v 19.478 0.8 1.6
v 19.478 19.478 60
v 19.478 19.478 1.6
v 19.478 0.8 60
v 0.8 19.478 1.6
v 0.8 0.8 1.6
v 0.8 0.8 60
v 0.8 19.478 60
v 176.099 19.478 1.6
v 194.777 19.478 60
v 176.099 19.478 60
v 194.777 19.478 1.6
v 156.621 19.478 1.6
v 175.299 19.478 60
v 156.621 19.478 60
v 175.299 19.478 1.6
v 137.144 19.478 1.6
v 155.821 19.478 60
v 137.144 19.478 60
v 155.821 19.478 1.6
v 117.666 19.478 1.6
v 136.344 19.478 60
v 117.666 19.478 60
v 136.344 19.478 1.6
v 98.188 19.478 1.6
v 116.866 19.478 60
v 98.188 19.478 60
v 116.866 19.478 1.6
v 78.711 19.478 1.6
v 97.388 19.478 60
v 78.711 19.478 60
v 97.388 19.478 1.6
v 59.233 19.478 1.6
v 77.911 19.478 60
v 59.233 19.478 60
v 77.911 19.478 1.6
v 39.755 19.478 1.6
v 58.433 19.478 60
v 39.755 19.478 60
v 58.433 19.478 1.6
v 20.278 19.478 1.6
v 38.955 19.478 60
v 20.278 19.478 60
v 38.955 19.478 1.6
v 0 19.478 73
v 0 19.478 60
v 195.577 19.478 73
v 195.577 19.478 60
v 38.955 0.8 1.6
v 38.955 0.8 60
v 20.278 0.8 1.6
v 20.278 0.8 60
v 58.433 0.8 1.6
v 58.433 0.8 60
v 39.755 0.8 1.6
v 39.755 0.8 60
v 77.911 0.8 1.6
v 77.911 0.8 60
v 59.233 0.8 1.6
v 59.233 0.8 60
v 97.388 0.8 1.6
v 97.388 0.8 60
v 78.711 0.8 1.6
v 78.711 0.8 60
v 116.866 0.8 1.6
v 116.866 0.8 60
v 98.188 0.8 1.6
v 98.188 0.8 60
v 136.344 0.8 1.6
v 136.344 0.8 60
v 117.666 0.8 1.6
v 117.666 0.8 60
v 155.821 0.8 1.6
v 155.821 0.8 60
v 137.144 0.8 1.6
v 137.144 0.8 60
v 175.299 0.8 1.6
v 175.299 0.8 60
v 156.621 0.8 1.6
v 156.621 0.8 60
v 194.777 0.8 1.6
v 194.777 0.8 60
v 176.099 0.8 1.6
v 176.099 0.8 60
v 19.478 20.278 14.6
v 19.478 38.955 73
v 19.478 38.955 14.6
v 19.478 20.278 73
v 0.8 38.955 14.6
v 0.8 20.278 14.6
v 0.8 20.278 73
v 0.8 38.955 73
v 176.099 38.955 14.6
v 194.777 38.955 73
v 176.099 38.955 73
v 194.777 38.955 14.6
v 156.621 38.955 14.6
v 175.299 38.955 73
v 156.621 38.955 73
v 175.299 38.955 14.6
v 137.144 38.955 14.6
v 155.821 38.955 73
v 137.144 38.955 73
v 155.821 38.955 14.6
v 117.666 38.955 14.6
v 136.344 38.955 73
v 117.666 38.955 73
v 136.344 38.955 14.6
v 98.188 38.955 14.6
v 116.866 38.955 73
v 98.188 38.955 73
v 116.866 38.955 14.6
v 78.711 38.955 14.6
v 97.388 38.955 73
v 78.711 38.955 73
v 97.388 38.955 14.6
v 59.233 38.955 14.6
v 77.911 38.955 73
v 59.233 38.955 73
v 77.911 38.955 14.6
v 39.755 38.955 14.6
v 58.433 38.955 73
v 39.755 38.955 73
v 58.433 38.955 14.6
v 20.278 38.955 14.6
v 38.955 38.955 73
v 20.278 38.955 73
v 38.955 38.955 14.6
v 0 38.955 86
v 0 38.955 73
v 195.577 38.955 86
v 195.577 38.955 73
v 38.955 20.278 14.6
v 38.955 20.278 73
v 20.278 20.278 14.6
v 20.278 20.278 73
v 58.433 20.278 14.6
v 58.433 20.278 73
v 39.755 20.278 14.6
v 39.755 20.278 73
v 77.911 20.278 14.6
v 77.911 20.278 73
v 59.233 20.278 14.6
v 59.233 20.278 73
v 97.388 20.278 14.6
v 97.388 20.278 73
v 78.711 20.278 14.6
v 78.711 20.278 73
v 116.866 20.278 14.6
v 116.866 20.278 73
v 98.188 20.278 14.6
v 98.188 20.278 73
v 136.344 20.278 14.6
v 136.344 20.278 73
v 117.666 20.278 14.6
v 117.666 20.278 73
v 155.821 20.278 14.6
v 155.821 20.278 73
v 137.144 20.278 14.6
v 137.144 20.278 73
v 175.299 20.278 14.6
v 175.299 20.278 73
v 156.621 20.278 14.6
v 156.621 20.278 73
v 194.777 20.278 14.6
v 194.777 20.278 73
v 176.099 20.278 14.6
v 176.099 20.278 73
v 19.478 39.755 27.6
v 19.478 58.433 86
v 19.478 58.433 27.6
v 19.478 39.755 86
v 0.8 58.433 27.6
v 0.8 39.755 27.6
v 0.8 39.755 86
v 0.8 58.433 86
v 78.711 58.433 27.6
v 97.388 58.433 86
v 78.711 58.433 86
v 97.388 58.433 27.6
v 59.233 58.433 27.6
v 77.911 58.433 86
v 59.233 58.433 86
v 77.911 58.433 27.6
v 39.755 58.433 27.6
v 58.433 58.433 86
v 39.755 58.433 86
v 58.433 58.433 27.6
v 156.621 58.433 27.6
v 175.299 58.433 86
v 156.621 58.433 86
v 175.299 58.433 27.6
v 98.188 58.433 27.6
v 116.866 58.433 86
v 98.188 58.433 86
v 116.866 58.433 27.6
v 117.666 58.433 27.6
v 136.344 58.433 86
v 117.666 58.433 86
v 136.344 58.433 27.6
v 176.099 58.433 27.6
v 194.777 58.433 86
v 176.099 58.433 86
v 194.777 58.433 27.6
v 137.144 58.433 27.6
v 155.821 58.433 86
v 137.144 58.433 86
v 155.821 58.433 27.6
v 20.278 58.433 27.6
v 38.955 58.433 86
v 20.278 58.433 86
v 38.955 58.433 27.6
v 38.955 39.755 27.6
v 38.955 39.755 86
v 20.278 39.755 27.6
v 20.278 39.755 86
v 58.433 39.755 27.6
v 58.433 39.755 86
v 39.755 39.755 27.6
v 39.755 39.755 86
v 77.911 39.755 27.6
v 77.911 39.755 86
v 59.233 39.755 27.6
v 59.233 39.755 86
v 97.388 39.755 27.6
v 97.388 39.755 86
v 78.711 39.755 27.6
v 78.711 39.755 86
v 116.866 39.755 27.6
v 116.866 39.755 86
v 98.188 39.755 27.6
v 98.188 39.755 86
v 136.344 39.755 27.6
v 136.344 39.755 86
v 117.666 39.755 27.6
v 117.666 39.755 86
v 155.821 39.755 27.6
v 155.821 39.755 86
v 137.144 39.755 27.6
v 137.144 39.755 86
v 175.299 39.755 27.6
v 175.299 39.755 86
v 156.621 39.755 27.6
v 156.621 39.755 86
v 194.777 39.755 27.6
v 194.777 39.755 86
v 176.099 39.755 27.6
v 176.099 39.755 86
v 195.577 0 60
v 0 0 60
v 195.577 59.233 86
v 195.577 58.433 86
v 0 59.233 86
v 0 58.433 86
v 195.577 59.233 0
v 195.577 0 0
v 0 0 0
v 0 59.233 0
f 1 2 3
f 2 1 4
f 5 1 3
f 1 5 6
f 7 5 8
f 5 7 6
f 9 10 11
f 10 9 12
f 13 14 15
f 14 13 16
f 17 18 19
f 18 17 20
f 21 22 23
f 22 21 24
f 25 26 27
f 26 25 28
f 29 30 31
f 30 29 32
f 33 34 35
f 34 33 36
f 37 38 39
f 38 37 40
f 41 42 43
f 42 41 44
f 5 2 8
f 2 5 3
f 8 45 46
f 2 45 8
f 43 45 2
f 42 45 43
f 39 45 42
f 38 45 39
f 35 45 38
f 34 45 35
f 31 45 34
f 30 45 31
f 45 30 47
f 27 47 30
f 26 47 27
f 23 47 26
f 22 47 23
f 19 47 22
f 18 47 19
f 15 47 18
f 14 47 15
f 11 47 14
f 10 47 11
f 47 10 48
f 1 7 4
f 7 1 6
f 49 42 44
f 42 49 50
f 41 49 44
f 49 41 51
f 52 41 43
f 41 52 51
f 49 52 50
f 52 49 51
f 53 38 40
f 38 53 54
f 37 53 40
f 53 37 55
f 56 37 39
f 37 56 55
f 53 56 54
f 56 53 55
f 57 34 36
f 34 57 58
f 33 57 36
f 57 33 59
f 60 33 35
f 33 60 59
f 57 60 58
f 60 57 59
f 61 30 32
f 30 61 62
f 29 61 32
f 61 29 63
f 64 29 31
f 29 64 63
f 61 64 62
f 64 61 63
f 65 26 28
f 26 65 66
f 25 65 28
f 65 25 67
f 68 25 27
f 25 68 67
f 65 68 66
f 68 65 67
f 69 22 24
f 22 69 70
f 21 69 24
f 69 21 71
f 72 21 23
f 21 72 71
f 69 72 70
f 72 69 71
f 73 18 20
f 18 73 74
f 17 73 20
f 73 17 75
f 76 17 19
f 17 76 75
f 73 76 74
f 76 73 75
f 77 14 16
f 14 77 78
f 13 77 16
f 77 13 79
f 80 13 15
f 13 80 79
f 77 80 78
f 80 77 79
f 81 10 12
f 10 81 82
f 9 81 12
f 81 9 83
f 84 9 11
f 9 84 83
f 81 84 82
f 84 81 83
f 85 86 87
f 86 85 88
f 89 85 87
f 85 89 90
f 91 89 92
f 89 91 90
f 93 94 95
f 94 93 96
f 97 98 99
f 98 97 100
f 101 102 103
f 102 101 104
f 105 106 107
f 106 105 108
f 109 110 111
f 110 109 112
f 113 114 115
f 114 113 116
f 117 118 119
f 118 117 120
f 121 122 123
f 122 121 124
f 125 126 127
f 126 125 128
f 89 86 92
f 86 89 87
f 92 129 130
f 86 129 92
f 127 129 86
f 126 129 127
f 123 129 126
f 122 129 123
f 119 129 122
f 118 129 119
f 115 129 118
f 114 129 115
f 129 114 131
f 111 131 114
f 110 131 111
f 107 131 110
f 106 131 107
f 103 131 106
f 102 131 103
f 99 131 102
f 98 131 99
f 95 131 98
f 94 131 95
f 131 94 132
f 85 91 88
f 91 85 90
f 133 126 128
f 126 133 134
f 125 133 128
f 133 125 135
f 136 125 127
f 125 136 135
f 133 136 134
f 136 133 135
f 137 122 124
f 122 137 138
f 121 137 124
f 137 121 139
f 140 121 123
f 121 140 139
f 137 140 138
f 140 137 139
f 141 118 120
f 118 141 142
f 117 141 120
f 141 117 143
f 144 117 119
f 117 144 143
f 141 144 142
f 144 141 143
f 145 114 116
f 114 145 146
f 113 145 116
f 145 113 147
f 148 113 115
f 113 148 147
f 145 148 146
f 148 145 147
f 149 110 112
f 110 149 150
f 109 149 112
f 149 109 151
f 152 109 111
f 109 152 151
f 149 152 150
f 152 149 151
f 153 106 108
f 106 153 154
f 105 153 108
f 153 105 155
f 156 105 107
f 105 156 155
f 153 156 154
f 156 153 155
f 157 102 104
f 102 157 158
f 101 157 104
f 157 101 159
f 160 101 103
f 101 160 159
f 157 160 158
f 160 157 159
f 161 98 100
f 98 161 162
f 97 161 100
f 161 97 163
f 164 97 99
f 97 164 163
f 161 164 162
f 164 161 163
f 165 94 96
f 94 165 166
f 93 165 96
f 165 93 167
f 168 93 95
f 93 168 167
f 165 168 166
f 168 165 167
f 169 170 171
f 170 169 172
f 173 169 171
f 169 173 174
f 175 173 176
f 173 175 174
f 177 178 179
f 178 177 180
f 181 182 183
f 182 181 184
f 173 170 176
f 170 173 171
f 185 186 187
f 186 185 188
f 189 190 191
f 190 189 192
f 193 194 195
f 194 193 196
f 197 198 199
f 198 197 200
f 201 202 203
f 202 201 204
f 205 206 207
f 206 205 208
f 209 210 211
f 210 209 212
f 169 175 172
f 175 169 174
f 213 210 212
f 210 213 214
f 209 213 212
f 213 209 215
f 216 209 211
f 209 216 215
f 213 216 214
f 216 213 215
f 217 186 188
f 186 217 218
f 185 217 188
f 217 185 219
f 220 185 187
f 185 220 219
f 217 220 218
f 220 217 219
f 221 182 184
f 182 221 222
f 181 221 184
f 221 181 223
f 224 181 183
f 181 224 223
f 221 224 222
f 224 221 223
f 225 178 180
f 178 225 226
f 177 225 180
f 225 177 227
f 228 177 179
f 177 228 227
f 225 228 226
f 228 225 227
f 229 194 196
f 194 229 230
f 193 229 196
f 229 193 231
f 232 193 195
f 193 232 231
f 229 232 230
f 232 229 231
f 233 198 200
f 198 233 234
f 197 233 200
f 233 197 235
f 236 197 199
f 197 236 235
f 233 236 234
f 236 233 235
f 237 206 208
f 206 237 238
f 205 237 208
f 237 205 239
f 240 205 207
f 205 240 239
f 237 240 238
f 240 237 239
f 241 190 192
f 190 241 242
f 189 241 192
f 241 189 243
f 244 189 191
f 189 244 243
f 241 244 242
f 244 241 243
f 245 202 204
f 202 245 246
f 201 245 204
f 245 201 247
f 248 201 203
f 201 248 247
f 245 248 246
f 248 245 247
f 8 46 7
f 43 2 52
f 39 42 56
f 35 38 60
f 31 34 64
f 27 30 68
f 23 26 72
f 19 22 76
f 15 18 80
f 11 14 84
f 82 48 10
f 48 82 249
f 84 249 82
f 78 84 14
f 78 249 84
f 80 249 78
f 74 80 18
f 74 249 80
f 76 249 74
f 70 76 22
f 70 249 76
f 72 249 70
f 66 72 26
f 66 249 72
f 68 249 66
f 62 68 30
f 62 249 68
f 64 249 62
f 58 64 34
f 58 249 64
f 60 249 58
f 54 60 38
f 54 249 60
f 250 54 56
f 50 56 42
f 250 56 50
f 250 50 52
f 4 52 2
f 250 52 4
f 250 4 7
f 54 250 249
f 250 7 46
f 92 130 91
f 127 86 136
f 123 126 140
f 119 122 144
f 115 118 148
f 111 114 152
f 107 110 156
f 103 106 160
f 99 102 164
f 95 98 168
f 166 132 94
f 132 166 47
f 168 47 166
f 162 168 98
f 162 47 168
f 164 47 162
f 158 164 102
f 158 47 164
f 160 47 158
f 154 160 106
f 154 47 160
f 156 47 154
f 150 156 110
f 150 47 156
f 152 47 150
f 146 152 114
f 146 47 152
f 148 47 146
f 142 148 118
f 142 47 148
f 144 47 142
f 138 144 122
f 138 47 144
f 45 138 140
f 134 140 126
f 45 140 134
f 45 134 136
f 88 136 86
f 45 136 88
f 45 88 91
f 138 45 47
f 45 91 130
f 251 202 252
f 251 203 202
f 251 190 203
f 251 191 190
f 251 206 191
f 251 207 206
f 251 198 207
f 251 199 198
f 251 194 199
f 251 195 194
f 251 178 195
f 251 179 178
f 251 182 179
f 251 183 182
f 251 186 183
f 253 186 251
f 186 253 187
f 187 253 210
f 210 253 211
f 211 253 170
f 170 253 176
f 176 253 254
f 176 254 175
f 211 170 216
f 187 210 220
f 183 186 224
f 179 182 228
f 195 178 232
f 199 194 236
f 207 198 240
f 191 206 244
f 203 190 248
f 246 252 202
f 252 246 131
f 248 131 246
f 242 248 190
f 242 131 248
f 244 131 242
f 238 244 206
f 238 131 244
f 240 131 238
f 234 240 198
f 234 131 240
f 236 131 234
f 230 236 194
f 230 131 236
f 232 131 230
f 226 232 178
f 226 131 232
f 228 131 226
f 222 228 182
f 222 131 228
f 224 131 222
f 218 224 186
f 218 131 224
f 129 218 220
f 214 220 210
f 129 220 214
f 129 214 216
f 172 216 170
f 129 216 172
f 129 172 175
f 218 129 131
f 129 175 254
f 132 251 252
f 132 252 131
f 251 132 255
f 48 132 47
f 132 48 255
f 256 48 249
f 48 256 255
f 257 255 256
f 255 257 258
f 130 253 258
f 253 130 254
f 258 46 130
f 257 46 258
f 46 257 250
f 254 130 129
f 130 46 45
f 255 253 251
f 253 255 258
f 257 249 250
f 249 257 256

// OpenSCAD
// paint
pot_x=10;
pot_y=3;

pot_w = 1+25/sqrt(2);
pot_p = 1+25/sqrt(2);
pot_h = 60;
escalier_h = 13;


// batonnet de glace :
/*pot_x=7;
pot_y=2;
pot_w = 10+1;
pot_p = pot_w;
escalier_h = pot_w; */



wall = .8;


difference() {
	cube([pot_x*pot_w+wall*pot_x+wall, pot_y*pot_p+wall*pot_y+wall,pot_h+escalier_h*(pot_y-1)]);
	for(y = [0:pot_y-1]) {
		for(x = [0:pot_x-1]) 
			translate([x*pot_w + wall+wall*x,wall+y*pot_p+wall*y,wall*2+y*escalier_h])
				cube([pot_w,pot_p,90]);
		translate([-5, -5, pot_h+y*escalier_h])
			cube([400,pot_p+ pot_p*y+wall*y+wall+5,100]);//*/
	}
}
